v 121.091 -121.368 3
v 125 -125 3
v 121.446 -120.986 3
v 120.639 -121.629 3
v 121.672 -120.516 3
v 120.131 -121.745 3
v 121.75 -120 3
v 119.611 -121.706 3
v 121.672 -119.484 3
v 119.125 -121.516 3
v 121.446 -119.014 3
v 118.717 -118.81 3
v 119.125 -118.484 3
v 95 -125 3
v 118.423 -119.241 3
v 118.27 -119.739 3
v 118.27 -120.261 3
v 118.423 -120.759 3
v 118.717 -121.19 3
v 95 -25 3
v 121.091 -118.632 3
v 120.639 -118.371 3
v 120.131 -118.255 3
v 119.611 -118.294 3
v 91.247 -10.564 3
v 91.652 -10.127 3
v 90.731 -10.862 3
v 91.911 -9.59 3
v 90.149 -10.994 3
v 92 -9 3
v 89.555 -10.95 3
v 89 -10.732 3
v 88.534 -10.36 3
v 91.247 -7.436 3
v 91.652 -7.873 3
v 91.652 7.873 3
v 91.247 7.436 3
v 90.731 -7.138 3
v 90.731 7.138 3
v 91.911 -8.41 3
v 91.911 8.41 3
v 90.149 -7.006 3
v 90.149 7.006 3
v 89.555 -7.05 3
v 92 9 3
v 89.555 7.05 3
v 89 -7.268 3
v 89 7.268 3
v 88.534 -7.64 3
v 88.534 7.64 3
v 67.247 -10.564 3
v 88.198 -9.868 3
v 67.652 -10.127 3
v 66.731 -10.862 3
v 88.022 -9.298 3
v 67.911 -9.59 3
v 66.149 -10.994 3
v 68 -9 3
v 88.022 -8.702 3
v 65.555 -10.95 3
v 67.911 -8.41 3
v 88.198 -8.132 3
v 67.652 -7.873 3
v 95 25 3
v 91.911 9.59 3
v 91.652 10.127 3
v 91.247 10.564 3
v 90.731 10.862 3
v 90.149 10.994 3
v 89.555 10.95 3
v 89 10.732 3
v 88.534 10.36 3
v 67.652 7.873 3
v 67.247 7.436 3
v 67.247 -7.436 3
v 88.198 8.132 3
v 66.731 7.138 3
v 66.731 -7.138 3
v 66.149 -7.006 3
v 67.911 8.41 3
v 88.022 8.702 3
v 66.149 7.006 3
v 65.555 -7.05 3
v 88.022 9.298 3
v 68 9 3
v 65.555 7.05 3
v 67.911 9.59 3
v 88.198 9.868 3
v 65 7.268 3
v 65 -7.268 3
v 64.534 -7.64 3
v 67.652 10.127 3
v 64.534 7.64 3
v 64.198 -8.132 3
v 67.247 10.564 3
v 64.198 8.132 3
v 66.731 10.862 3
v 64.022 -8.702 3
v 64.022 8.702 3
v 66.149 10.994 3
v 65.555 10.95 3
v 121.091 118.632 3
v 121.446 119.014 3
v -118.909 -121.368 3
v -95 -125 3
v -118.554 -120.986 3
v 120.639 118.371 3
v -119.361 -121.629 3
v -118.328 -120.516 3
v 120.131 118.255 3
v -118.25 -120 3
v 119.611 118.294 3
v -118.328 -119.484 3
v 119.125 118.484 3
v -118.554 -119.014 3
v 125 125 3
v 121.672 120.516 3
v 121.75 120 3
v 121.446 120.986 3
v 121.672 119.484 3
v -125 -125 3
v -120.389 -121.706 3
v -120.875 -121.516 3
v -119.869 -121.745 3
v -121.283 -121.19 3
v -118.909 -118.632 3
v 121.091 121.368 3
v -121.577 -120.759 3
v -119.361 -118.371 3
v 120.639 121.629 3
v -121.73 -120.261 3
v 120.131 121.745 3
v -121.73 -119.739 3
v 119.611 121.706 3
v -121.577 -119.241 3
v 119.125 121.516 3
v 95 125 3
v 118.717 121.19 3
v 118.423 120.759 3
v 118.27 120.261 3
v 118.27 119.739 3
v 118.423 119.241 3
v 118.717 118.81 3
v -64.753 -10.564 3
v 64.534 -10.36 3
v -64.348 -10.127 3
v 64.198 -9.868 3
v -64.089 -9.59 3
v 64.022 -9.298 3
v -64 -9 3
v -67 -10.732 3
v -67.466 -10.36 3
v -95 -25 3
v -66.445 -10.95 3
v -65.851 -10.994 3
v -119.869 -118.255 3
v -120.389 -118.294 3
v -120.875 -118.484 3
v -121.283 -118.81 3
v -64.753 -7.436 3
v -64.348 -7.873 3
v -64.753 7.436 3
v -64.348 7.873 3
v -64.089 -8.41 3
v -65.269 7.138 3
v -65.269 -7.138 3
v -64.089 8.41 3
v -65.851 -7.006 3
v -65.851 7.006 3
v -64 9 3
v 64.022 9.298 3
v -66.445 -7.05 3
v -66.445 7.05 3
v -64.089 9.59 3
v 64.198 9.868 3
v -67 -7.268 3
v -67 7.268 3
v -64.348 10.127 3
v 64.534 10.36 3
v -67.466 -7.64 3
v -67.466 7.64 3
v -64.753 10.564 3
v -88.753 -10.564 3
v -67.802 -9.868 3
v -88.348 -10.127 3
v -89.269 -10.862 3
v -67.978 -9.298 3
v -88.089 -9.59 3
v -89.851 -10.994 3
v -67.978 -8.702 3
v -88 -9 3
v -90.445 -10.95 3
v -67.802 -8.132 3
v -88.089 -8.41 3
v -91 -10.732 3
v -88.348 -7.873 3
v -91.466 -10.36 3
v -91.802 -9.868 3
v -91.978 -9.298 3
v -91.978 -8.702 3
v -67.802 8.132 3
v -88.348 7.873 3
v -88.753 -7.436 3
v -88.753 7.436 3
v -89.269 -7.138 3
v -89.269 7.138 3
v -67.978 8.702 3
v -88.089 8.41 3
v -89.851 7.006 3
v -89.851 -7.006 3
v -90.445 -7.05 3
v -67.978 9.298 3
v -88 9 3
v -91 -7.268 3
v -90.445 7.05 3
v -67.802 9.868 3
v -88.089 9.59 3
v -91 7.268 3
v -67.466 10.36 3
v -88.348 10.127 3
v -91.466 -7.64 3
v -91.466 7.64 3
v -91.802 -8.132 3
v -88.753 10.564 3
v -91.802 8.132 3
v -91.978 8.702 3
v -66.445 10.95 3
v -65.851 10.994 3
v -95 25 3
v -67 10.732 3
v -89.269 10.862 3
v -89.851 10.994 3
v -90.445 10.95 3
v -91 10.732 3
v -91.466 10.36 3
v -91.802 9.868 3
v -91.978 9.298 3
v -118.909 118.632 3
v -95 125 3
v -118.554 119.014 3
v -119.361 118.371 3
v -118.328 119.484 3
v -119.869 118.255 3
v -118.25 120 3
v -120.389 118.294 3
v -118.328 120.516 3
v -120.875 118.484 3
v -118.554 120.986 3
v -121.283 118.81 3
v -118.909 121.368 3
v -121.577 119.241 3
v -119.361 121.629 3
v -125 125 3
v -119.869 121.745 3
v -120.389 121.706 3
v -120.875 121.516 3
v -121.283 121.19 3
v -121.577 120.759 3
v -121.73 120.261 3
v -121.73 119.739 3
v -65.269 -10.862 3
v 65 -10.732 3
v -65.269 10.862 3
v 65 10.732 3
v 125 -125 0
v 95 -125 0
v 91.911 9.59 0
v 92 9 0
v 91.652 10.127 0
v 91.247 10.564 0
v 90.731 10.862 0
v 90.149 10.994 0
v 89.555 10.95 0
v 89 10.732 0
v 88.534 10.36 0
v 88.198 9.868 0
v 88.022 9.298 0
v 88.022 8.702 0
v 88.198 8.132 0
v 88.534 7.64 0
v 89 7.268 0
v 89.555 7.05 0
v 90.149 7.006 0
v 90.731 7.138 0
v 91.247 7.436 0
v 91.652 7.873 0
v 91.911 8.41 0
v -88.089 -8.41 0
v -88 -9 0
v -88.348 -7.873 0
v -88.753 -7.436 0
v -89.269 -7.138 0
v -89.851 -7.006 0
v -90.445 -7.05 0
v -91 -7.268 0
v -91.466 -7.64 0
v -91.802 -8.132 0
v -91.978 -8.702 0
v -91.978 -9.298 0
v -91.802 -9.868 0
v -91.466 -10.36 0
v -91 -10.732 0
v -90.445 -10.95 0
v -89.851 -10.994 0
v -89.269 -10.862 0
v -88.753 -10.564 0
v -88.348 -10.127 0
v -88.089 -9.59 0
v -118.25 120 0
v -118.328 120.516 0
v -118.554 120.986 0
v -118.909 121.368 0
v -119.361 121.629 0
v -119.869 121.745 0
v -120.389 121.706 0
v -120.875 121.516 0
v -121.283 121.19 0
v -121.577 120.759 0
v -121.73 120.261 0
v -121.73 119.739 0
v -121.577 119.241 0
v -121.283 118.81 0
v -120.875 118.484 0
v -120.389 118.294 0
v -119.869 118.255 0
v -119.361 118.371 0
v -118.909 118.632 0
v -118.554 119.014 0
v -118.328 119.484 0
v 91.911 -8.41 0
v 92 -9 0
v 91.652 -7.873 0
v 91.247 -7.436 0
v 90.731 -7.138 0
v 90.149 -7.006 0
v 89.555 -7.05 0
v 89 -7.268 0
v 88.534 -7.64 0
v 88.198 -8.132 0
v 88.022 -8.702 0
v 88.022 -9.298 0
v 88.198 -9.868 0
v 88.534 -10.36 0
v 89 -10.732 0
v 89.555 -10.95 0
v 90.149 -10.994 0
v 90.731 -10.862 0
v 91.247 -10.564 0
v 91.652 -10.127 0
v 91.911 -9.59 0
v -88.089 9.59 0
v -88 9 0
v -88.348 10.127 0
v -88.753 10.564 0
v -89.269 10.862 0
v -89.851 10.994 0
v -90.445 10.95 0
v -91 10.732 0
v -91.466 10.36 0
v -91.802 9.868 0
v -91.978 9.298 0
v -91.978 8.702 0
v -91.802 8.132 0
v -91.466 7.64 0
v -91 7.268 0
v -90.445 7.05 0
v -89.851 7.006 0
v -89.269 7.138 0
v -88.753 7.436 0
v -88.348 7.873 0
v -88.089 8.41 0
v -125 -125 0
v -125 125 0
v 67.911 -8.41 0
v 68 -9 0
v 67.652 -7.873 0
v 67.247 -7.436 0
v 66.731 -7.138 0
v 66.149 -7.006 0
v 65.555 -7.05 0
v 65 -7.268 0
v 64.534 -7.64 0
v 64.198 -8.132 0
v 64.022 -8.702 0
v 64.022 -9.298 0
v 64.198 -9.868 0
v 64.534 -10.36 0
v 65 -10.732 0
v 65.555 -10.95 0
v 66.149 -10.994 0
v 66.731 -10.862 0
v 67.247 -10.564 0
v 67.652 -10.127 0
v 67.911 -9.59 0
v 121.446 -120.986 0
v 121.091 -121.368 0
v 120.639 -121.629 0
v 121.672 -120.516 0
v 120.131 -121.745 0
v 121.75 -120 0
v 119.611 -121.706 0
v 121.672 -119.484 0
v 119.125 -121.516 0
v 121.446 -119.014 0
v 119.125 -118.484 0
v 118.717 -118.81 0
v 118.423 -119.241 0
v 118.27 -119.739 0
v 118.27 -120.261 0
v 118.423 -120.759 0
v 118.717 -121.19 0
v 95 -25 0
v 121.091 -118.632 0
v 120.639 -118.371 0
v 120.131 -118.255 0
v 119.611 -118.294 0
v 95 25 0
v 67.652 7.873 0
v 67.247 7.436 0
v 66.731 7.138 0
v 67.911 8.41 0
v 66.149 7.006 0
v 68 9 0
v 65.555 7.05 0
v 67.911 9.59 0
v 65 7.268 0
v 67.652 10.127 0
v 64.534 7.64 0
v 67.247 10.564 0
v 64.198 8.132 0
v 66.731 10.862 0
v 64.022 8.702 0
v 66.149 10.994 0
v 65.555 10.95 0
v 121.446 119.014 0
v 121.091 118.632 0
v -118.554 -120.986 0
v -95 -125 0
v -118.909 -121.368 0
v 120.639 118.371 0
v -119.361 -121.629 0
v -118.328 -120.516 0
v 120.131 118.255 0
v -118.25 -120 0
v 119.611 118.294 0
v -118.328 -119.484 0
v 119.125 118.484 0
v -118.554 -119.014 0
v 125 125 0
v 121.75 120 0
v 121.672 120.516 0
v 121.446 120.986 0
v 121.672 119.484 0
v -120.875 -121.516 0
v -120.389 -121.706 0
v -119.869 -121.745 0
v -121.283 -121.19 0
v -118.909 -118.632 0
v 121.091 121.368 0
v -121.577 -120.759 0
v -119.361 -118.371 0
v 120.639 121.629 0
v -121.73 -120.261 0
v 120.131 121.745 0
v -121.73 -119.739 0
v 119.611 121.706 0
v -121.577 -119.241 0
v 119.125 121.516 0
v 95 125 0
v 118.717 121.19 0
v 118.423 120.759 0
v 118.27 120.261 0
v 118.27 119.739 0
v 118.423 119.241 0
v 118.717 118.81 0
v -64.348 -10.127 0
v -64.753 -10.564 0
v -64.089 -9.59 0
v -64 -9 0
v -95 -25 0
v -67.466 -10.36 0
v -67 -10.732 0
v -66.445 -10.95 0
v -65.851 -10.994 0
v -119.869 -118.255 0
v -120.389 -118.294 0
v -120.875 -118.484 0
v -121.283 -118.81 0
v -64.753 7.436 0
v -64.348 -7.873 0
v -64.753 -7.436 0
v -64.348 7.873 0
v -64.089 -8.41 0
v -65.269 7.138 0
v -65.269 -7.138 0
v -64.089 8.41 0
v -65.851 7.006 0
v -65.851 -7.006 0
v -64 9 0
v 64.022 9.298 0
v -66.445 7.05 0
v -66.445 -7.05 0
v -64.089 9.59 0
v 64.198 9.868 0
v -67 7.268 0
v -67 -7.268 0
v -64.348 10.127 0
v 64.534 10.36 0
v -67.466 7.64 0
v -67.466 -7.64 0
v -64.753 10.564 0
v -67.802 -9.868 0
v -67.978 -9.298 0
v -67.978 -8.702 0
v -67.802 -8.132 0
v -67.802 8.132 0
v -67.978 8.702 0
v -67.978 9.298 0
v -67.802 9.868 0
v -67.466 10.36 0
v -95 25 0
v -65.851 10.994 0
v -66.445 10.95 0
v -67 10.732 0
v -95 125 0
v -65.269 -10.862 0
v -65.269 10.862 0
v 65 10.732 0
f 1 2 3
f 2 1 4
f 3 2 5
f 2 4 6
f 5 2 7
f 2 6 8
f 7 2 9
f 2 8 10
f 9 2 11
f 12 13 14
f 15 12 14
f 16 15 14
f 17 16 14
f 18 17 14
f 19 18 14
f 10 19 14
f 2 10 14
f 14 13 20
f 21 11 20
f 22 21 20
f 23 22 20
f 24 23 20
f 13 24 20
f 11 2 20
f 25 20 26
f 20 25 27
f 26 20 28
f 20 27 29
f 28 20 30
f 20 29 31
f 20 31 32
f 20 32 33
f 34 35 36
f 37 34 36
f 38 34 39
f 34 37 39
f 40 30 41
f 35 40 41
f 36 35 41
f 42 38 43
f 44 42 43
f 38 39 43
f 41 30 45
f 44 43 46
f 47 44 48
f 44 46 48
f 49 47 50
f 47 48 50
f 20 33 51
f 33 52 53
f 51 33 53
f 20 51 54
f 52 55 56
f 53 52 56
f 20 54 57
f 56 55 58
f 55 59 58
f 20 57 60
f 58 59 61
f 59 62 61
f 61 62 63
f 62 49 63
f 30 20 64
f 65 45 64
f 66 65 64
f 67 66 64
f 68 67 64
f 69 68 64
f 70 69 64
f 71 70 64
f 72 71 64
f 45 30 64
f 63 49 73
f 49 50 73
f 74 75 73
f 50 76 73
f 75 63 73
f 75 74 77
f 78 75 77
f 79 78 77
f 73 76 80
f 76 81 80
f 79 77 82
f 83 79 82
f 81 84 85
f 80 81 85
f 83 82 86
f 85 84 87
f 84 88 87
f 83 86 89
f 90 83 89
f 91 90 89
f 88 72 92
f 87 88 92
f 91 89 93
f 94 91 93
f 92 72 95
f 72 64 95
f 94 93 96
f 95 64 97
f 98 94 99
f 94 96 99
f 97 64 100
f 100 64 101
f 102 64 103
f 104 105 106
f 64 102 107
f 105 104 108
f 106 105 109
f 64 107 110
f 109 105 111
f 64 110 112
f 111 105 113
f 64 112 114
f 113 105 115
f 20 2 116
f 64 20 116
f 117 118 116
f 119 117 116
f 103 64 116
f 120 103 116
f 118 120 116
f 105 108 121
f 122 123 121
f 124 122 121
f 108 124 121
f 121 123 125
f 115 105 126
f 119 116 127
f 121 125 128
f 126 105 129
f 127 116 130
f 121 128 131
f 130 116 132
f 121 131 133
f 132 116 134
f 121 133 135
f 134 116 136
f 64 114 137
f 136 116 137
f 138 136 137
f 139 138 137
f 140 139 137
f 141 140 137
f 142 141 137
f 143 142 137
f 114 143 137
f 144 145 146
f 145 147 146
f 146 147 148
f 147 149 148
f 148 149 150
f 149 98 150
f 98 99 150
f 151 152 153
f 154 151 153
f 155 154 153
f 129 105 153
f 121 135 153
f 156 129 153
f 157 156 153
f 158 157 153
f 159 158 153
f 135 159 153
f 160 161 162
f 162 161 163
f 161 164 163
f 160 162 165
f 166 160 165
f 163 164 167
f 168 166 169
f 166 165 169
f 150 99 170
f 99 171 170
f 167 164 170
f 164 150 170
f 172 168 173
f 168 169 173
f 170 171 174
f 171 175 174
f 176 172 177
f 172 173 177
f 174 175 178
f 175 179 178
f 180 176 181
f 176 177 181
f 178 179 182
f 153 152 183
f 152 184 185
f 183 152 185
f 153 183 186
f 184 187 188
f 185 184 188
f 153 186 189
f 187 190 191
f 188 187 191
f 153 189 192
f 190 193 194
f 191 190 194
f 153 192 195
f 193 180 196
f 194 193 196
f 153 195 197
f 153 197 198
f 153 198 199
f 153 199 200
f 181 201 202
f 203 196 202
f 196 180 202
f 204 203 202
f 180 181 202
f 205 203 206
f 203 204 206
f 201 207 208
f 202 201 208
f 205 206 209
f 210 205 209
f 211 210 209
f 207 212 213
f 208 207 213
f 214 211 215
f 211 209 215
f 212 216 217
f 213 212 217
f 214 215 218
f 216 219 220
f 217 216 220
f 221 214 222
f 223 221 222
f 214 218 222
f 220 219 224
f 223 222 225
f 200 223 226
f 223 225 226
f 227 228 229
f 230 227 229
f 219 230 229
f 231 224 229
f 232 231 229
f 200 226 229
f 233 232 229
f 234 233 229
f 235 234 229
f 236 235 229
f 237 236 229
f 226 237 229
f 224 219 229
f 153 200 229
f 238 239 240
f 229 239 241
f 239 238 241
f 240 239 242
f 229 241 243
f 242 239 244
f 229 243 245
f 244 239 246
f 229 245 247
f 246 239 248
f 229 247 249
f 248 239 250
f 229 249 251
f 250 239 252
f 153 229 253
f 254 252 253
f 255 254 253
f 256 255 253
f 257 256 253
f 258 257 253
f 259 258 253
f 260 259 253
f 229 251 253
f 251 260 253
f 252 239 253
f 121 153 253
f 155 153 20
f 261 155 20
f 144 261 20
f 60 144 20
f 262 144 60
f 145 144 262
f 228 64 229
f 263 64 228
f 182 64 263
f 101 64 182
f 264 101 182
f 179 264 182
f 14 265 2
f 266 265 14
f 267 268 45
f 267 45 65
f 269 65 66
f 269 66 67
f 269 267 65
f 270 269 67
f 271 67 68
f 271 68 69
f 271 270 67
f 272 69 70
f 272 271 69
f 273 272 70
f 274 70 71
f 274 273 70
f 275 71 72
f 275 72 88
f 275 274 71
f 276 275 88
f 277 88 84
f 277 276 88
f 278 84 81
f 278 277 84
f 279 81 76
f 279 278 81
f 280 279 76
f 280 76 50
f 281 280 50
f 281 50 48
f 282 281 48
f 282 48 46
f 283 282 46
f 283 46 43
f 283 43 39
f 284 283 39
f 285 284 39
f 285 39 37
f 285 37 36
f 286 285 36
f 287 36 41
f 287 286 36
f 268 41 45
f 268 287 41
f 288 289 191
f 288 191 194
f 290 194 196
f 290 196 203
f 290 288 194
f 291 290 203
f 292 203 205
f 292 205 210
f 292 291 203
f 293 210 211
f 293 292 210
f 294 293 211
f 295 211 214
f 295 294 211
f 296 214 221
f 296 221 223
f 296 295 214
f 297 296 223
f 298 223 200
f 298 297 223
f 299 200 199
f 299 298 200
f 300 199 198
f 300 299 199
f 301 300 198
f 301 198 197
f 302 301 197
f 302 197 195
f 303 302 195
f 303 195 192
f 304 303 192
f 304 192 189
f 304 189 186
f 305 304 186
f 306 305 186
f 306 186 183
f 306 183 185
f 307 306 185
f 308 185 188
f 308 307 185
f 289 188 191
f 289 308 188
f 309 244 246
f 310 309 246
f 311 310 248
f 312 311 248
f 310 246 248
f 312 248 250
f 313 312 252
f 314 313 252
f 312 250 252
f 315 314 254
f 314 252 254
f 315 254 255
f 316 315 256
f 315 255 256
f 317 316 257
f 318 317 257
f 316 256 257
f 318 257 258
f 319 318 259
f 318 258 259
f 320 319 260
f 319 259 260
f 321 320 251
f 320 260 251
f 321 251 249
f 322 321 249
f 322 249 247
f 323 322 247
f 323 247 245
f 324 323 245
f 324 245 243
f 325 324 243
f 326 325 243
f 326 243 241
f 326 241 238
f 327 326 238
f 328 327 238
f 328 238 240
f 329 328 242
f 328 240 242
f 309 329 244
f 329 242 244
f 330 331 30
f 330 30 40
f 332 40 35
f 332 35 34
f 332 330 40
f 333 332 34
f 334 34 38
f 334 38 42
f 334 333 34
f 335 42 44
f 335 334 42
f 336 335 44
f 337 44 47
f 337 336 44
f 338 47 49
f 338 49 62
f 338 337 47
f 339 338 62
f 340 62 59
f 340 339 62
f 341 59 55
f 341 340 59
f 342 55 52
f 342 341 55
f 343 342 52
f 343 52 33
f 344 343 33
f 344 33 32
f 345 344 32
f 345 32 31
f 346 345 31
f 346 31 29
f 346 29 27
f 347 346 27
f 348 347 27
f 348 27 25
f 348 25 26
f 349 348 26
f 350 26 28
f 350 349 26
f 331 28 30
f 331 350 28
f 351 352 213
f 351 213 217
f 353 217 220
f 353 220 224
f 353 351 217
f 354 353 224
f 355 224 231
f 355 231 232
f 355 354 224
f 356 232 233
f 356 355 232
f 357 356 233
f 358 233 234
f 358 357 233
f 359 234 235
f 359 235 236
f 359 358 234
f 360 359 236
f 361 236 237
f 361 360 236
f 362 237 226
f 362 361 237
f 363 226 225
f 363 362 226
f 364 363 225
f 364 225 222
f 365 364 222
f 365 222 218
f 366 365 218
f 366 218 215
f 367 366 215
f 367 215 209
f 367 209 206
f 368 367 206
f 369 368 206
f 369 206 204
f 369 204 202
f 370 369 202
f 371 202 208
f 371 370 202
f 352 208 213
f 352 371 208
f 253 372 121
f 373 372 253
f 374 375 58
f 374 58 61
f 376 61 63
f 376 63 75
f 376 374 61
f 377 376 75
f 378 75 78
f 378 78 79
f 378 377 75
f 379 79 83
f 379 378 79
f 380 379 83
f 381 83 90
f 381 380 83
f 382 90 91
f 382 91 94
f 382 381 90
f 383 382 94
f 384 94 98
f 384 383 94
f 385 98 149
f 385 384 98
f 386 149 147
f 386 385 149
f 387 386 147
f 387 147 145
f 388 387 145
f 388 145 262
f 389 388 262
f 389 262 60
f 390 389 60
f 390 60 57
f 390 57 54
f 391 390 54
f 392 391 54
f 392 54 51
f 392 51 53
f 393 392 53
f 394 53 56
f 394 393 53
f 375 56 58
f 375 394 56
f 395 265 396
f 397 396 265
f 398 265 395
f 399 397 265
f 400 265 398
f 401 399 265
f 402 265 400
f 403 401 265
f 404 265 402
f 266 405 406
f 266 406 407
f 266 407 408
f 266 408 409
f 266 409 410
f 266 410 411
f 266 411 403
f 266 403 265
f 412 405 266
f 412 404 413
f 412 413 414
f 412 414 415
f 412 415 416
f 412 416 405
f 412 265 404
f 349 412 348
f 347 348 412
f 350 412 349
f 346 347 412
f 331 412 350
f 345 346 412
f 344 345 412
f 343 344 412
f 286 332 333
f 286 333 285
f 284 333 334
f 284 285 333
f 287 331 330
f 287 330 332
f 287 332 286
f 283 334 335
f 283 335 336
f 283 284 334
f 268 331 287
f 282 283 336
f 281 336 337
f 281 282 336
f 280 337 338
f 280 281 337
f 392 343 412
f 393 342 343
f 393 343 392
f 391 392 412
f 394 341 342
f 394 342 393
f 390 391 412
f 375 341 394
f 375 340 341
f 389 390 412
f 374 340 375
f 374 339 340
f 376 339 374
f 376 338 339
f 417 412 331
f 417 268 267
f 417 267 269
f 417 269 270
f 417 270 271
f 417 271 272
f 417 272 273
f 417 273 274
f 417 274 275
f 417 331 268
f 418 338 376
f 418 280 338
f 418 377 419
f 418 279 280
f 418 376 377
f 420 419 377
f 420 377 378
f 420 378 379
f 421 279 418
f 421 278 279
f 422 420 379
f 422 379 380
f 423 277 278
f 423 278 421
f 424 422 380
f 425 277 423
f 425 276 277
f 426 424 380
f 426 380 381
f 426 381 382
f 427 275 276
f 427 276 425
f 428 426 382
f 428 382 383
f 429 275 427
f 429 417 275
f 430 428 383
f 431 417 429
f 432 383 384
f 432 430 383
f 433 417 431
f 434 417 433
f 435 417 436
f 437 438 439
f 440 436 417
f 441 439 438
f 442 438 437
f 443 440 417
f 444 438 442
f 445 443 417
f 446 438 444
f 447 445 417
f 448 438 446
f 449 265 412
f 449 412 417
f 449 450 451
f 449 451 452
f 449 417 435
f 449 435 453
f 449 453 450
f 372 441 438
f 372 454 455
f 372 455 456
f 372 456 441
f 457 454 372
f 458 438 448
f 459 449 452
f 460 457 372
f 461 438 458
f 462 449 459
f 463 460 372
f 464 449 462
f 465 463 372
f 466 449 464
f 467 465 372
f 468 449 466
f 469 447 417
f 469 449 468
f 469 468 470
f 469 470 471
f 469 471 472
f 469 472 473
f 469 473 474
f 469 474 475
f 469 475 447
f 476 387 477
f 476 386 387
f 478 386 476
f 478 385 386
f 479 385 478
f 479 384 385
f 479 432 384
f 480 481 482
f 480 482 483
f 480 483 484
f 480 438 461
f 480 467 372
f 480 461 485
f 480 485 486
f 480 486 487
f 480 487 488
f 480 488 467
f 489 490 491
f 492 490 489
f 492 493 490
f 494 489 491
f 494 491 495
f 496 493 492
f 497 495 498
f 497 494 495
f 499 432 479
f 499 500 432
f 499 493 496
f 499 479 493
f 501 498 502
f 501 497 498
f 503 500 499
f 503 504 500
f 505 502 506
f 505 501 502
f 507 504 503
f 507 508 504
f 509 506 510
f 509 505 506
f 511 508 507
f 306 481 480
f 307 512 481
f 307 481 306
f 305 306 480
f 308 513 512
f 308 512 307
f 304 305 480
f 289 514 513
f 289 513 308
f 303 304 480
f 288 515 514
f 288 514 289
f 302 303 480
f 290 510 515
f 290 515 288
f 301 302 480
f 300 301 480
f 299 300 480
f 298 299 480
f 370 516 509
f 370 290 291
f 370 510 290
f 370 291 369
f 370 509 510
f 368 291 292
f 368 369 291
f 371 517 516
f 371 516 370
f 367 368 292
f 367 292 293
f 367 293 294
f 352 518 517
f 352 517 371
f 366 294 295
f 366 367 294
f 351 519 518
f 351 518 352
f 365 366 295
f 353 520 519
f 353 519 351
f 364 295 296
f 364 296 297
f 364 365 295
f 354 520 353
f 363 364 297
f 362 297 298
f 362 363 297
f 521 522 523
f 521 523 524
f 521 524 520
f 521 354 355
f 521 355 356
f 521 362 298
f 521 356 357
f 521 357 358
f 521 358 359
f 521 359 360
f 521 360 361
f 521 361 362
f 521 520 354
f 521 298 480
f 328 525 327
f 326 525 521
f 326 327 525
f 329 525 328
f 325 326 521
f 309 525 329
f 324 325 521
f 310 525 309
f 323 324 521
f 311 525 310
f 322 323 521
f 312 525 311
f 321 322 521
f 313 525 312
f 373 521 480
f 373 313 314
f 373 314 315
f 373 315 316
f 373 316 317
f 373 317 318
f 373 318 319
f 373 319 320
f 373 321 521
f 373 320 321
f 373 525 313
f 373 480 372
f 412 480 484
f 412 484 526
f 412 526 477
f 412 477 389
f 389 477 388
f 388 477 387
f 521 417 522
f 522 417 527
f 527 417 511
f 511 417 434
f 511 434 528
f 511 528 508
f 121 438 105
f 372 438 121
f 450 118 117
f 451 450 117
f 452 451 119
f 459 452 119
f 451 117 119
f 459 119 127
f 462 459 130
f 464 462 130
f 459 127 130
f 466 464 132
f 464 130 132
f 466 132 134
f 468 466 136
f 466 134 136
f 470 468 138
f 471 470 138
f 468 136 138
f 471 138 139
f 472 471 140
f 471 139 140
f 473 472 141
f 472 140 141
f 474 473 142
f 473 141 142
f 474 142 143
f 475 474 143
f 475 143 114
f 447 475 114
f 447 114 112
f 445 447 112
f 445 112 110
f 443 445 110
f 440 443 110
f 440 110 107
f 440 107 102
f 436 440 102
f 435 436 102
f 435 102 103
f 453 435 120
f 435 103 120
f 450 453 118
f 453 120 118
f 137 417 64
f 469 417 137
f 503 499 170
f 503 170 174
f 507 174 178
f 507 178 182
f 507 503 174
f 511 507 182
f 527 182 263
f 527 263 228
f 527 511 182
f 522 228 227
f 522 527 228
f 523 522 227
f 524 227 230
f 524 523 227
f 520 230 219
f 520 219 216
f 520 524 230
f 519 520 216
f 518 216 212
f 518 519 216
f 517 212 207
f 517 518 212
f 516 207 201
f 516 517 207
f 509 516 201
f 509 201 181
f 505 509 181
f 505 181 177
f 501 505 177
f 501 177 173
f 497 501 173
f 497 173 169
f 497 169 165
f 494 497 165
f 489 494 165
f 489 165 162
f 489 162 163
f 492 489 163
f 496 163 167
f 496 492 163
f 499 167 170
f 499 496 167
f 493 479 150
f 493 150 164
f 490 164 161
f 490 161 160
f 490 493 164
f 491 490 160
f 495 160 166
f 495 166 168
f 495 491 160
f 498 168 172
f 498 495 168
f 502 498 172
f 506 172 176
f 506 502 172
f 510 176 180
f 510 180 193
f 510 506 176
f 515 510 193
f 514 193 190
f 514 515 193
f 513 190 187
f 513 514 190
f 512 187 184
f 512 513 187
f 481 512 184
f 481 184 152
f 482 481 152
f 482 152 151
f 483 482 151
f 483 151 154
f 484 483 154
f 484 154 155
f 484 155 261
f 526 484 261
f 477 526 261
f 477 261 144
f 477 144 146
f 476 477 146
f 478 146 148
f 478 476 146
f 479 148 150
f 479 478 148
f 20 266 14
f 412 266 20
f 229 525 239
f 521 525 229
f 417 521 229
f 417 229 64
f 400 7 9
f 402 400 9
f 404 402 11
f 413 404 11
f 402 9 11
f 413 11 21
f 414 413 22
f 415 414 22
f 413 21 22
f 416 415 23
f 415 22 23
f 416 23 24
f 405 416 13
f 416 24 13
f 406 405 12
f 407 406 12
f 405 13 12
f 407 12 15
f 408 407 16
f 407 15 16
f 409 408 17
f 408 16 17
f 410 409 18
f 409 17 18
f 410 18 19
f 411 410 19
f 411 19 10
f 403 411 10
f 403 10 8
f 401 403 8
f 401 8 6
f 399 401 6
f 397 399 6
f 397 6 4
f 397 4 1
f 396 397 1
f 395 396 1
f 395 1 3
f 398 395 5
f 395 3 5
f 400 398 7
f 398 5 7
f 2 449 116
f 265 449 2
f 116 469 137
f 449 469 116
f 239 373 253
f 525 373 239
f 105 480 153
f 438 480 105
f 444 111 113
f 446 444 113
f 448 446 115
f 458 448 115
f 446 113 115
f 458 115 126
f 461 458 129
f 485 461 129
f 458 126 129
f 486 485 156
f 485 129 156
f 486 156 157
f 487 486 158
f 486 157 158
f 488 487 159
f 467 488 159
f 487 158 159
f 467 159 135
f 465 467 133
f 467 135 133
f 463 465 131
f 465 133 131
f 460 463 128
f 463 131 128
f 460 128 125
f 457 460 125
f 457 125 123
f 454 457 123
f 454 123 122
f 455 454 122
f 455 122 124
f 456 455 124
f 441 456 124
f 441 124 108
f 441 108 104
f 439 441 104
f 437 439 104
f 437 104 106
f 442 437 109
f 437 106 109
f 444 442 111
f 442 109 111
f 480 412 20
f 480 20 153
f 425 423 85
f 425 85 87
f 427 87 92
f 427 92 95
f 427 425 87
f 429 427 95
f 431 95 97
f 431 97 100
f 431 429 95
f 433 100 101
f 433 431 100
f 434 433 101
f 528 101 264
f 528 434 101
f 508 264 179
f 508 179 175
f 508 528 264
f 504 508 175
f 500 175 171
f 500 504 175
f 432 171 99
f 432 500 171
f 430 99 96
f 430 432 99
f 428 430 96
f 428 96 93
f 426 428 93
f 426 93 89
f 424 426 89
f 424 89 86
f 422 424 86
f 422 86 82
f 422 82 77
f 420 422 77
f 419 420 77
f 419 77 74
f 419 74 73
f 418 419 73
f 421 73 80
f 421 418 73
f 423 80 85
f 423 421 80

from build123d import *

# Parameters (mm, degrees)
SKETCH1_R           = 2
BOSS_EXTRUDE1_DEPTH = 3
SKETCH3_R           = 1.75
CUT_EXTRUDE1_DEPTH  = 3


with BuildPart() as part:
    # Sketch1 → Boss-Extrude1 (new body)
    with BuildSketch(Plane.XY):
        Polygon((95, 125), (125, 125), (125, -125), (95, -125), (95, -25), (-95, -25), (-95, -125), (-125, -125), (-125, 125), (-95, 125), (-95, 25), (95, 25), align=None)
        with Locations((90, 9)):
            Circle(SKETCH1_R, mode=Mode.SUBTRACT)
        with Locations((90, -9)):
            Circle(SKETCH1_R, mode=Mode.SUBTRACT)
        with Locations((66, 9)):
            Circle(SKETCH1_R, mode=Mode.SUBTRACT)
        with Locations((66, -9)):
            Circle(SKETCH1_R, mode=Mode.SUBTRACT)
        with Locations((-66, -9)):
            Circle(SKETCH1_R, mode=Mode.SUBTRACT)
        with Locations((-66, 9)):
            Circle(SKETCH1_R, mode=Mode.SUBTRACT)
        with Locations((-90, -9)):
            Circle(SKETCH1_R, mode=Mode.SUBTRACT)
        with Locations((-90, 9)):
            Circle(SKETCH1_R, mode=Mode.SUBTRACT)
    extrude(amount=BOSS_EXTRUDE1_DEPTH)

    # Sketch3 → Cut-Extrude1 (cut)
    with BuildSketch(Plane.XY.offset(3)):
        with Locations((-120, 120)):
            Circle(SKETCH3_R)
        with Locations((120, 120)):
            Circle(SKETCH3_R)
        with Locations((-120, -120)):
            Circle(SKETCH3_R)
        with Locations((120, -120)):
            Circle(SKETCH3_R)
    extrude(amount=-CUT_EXTRUDE1_DEPTH, mode=Mode.SUBTRACT)


solid = part.part
